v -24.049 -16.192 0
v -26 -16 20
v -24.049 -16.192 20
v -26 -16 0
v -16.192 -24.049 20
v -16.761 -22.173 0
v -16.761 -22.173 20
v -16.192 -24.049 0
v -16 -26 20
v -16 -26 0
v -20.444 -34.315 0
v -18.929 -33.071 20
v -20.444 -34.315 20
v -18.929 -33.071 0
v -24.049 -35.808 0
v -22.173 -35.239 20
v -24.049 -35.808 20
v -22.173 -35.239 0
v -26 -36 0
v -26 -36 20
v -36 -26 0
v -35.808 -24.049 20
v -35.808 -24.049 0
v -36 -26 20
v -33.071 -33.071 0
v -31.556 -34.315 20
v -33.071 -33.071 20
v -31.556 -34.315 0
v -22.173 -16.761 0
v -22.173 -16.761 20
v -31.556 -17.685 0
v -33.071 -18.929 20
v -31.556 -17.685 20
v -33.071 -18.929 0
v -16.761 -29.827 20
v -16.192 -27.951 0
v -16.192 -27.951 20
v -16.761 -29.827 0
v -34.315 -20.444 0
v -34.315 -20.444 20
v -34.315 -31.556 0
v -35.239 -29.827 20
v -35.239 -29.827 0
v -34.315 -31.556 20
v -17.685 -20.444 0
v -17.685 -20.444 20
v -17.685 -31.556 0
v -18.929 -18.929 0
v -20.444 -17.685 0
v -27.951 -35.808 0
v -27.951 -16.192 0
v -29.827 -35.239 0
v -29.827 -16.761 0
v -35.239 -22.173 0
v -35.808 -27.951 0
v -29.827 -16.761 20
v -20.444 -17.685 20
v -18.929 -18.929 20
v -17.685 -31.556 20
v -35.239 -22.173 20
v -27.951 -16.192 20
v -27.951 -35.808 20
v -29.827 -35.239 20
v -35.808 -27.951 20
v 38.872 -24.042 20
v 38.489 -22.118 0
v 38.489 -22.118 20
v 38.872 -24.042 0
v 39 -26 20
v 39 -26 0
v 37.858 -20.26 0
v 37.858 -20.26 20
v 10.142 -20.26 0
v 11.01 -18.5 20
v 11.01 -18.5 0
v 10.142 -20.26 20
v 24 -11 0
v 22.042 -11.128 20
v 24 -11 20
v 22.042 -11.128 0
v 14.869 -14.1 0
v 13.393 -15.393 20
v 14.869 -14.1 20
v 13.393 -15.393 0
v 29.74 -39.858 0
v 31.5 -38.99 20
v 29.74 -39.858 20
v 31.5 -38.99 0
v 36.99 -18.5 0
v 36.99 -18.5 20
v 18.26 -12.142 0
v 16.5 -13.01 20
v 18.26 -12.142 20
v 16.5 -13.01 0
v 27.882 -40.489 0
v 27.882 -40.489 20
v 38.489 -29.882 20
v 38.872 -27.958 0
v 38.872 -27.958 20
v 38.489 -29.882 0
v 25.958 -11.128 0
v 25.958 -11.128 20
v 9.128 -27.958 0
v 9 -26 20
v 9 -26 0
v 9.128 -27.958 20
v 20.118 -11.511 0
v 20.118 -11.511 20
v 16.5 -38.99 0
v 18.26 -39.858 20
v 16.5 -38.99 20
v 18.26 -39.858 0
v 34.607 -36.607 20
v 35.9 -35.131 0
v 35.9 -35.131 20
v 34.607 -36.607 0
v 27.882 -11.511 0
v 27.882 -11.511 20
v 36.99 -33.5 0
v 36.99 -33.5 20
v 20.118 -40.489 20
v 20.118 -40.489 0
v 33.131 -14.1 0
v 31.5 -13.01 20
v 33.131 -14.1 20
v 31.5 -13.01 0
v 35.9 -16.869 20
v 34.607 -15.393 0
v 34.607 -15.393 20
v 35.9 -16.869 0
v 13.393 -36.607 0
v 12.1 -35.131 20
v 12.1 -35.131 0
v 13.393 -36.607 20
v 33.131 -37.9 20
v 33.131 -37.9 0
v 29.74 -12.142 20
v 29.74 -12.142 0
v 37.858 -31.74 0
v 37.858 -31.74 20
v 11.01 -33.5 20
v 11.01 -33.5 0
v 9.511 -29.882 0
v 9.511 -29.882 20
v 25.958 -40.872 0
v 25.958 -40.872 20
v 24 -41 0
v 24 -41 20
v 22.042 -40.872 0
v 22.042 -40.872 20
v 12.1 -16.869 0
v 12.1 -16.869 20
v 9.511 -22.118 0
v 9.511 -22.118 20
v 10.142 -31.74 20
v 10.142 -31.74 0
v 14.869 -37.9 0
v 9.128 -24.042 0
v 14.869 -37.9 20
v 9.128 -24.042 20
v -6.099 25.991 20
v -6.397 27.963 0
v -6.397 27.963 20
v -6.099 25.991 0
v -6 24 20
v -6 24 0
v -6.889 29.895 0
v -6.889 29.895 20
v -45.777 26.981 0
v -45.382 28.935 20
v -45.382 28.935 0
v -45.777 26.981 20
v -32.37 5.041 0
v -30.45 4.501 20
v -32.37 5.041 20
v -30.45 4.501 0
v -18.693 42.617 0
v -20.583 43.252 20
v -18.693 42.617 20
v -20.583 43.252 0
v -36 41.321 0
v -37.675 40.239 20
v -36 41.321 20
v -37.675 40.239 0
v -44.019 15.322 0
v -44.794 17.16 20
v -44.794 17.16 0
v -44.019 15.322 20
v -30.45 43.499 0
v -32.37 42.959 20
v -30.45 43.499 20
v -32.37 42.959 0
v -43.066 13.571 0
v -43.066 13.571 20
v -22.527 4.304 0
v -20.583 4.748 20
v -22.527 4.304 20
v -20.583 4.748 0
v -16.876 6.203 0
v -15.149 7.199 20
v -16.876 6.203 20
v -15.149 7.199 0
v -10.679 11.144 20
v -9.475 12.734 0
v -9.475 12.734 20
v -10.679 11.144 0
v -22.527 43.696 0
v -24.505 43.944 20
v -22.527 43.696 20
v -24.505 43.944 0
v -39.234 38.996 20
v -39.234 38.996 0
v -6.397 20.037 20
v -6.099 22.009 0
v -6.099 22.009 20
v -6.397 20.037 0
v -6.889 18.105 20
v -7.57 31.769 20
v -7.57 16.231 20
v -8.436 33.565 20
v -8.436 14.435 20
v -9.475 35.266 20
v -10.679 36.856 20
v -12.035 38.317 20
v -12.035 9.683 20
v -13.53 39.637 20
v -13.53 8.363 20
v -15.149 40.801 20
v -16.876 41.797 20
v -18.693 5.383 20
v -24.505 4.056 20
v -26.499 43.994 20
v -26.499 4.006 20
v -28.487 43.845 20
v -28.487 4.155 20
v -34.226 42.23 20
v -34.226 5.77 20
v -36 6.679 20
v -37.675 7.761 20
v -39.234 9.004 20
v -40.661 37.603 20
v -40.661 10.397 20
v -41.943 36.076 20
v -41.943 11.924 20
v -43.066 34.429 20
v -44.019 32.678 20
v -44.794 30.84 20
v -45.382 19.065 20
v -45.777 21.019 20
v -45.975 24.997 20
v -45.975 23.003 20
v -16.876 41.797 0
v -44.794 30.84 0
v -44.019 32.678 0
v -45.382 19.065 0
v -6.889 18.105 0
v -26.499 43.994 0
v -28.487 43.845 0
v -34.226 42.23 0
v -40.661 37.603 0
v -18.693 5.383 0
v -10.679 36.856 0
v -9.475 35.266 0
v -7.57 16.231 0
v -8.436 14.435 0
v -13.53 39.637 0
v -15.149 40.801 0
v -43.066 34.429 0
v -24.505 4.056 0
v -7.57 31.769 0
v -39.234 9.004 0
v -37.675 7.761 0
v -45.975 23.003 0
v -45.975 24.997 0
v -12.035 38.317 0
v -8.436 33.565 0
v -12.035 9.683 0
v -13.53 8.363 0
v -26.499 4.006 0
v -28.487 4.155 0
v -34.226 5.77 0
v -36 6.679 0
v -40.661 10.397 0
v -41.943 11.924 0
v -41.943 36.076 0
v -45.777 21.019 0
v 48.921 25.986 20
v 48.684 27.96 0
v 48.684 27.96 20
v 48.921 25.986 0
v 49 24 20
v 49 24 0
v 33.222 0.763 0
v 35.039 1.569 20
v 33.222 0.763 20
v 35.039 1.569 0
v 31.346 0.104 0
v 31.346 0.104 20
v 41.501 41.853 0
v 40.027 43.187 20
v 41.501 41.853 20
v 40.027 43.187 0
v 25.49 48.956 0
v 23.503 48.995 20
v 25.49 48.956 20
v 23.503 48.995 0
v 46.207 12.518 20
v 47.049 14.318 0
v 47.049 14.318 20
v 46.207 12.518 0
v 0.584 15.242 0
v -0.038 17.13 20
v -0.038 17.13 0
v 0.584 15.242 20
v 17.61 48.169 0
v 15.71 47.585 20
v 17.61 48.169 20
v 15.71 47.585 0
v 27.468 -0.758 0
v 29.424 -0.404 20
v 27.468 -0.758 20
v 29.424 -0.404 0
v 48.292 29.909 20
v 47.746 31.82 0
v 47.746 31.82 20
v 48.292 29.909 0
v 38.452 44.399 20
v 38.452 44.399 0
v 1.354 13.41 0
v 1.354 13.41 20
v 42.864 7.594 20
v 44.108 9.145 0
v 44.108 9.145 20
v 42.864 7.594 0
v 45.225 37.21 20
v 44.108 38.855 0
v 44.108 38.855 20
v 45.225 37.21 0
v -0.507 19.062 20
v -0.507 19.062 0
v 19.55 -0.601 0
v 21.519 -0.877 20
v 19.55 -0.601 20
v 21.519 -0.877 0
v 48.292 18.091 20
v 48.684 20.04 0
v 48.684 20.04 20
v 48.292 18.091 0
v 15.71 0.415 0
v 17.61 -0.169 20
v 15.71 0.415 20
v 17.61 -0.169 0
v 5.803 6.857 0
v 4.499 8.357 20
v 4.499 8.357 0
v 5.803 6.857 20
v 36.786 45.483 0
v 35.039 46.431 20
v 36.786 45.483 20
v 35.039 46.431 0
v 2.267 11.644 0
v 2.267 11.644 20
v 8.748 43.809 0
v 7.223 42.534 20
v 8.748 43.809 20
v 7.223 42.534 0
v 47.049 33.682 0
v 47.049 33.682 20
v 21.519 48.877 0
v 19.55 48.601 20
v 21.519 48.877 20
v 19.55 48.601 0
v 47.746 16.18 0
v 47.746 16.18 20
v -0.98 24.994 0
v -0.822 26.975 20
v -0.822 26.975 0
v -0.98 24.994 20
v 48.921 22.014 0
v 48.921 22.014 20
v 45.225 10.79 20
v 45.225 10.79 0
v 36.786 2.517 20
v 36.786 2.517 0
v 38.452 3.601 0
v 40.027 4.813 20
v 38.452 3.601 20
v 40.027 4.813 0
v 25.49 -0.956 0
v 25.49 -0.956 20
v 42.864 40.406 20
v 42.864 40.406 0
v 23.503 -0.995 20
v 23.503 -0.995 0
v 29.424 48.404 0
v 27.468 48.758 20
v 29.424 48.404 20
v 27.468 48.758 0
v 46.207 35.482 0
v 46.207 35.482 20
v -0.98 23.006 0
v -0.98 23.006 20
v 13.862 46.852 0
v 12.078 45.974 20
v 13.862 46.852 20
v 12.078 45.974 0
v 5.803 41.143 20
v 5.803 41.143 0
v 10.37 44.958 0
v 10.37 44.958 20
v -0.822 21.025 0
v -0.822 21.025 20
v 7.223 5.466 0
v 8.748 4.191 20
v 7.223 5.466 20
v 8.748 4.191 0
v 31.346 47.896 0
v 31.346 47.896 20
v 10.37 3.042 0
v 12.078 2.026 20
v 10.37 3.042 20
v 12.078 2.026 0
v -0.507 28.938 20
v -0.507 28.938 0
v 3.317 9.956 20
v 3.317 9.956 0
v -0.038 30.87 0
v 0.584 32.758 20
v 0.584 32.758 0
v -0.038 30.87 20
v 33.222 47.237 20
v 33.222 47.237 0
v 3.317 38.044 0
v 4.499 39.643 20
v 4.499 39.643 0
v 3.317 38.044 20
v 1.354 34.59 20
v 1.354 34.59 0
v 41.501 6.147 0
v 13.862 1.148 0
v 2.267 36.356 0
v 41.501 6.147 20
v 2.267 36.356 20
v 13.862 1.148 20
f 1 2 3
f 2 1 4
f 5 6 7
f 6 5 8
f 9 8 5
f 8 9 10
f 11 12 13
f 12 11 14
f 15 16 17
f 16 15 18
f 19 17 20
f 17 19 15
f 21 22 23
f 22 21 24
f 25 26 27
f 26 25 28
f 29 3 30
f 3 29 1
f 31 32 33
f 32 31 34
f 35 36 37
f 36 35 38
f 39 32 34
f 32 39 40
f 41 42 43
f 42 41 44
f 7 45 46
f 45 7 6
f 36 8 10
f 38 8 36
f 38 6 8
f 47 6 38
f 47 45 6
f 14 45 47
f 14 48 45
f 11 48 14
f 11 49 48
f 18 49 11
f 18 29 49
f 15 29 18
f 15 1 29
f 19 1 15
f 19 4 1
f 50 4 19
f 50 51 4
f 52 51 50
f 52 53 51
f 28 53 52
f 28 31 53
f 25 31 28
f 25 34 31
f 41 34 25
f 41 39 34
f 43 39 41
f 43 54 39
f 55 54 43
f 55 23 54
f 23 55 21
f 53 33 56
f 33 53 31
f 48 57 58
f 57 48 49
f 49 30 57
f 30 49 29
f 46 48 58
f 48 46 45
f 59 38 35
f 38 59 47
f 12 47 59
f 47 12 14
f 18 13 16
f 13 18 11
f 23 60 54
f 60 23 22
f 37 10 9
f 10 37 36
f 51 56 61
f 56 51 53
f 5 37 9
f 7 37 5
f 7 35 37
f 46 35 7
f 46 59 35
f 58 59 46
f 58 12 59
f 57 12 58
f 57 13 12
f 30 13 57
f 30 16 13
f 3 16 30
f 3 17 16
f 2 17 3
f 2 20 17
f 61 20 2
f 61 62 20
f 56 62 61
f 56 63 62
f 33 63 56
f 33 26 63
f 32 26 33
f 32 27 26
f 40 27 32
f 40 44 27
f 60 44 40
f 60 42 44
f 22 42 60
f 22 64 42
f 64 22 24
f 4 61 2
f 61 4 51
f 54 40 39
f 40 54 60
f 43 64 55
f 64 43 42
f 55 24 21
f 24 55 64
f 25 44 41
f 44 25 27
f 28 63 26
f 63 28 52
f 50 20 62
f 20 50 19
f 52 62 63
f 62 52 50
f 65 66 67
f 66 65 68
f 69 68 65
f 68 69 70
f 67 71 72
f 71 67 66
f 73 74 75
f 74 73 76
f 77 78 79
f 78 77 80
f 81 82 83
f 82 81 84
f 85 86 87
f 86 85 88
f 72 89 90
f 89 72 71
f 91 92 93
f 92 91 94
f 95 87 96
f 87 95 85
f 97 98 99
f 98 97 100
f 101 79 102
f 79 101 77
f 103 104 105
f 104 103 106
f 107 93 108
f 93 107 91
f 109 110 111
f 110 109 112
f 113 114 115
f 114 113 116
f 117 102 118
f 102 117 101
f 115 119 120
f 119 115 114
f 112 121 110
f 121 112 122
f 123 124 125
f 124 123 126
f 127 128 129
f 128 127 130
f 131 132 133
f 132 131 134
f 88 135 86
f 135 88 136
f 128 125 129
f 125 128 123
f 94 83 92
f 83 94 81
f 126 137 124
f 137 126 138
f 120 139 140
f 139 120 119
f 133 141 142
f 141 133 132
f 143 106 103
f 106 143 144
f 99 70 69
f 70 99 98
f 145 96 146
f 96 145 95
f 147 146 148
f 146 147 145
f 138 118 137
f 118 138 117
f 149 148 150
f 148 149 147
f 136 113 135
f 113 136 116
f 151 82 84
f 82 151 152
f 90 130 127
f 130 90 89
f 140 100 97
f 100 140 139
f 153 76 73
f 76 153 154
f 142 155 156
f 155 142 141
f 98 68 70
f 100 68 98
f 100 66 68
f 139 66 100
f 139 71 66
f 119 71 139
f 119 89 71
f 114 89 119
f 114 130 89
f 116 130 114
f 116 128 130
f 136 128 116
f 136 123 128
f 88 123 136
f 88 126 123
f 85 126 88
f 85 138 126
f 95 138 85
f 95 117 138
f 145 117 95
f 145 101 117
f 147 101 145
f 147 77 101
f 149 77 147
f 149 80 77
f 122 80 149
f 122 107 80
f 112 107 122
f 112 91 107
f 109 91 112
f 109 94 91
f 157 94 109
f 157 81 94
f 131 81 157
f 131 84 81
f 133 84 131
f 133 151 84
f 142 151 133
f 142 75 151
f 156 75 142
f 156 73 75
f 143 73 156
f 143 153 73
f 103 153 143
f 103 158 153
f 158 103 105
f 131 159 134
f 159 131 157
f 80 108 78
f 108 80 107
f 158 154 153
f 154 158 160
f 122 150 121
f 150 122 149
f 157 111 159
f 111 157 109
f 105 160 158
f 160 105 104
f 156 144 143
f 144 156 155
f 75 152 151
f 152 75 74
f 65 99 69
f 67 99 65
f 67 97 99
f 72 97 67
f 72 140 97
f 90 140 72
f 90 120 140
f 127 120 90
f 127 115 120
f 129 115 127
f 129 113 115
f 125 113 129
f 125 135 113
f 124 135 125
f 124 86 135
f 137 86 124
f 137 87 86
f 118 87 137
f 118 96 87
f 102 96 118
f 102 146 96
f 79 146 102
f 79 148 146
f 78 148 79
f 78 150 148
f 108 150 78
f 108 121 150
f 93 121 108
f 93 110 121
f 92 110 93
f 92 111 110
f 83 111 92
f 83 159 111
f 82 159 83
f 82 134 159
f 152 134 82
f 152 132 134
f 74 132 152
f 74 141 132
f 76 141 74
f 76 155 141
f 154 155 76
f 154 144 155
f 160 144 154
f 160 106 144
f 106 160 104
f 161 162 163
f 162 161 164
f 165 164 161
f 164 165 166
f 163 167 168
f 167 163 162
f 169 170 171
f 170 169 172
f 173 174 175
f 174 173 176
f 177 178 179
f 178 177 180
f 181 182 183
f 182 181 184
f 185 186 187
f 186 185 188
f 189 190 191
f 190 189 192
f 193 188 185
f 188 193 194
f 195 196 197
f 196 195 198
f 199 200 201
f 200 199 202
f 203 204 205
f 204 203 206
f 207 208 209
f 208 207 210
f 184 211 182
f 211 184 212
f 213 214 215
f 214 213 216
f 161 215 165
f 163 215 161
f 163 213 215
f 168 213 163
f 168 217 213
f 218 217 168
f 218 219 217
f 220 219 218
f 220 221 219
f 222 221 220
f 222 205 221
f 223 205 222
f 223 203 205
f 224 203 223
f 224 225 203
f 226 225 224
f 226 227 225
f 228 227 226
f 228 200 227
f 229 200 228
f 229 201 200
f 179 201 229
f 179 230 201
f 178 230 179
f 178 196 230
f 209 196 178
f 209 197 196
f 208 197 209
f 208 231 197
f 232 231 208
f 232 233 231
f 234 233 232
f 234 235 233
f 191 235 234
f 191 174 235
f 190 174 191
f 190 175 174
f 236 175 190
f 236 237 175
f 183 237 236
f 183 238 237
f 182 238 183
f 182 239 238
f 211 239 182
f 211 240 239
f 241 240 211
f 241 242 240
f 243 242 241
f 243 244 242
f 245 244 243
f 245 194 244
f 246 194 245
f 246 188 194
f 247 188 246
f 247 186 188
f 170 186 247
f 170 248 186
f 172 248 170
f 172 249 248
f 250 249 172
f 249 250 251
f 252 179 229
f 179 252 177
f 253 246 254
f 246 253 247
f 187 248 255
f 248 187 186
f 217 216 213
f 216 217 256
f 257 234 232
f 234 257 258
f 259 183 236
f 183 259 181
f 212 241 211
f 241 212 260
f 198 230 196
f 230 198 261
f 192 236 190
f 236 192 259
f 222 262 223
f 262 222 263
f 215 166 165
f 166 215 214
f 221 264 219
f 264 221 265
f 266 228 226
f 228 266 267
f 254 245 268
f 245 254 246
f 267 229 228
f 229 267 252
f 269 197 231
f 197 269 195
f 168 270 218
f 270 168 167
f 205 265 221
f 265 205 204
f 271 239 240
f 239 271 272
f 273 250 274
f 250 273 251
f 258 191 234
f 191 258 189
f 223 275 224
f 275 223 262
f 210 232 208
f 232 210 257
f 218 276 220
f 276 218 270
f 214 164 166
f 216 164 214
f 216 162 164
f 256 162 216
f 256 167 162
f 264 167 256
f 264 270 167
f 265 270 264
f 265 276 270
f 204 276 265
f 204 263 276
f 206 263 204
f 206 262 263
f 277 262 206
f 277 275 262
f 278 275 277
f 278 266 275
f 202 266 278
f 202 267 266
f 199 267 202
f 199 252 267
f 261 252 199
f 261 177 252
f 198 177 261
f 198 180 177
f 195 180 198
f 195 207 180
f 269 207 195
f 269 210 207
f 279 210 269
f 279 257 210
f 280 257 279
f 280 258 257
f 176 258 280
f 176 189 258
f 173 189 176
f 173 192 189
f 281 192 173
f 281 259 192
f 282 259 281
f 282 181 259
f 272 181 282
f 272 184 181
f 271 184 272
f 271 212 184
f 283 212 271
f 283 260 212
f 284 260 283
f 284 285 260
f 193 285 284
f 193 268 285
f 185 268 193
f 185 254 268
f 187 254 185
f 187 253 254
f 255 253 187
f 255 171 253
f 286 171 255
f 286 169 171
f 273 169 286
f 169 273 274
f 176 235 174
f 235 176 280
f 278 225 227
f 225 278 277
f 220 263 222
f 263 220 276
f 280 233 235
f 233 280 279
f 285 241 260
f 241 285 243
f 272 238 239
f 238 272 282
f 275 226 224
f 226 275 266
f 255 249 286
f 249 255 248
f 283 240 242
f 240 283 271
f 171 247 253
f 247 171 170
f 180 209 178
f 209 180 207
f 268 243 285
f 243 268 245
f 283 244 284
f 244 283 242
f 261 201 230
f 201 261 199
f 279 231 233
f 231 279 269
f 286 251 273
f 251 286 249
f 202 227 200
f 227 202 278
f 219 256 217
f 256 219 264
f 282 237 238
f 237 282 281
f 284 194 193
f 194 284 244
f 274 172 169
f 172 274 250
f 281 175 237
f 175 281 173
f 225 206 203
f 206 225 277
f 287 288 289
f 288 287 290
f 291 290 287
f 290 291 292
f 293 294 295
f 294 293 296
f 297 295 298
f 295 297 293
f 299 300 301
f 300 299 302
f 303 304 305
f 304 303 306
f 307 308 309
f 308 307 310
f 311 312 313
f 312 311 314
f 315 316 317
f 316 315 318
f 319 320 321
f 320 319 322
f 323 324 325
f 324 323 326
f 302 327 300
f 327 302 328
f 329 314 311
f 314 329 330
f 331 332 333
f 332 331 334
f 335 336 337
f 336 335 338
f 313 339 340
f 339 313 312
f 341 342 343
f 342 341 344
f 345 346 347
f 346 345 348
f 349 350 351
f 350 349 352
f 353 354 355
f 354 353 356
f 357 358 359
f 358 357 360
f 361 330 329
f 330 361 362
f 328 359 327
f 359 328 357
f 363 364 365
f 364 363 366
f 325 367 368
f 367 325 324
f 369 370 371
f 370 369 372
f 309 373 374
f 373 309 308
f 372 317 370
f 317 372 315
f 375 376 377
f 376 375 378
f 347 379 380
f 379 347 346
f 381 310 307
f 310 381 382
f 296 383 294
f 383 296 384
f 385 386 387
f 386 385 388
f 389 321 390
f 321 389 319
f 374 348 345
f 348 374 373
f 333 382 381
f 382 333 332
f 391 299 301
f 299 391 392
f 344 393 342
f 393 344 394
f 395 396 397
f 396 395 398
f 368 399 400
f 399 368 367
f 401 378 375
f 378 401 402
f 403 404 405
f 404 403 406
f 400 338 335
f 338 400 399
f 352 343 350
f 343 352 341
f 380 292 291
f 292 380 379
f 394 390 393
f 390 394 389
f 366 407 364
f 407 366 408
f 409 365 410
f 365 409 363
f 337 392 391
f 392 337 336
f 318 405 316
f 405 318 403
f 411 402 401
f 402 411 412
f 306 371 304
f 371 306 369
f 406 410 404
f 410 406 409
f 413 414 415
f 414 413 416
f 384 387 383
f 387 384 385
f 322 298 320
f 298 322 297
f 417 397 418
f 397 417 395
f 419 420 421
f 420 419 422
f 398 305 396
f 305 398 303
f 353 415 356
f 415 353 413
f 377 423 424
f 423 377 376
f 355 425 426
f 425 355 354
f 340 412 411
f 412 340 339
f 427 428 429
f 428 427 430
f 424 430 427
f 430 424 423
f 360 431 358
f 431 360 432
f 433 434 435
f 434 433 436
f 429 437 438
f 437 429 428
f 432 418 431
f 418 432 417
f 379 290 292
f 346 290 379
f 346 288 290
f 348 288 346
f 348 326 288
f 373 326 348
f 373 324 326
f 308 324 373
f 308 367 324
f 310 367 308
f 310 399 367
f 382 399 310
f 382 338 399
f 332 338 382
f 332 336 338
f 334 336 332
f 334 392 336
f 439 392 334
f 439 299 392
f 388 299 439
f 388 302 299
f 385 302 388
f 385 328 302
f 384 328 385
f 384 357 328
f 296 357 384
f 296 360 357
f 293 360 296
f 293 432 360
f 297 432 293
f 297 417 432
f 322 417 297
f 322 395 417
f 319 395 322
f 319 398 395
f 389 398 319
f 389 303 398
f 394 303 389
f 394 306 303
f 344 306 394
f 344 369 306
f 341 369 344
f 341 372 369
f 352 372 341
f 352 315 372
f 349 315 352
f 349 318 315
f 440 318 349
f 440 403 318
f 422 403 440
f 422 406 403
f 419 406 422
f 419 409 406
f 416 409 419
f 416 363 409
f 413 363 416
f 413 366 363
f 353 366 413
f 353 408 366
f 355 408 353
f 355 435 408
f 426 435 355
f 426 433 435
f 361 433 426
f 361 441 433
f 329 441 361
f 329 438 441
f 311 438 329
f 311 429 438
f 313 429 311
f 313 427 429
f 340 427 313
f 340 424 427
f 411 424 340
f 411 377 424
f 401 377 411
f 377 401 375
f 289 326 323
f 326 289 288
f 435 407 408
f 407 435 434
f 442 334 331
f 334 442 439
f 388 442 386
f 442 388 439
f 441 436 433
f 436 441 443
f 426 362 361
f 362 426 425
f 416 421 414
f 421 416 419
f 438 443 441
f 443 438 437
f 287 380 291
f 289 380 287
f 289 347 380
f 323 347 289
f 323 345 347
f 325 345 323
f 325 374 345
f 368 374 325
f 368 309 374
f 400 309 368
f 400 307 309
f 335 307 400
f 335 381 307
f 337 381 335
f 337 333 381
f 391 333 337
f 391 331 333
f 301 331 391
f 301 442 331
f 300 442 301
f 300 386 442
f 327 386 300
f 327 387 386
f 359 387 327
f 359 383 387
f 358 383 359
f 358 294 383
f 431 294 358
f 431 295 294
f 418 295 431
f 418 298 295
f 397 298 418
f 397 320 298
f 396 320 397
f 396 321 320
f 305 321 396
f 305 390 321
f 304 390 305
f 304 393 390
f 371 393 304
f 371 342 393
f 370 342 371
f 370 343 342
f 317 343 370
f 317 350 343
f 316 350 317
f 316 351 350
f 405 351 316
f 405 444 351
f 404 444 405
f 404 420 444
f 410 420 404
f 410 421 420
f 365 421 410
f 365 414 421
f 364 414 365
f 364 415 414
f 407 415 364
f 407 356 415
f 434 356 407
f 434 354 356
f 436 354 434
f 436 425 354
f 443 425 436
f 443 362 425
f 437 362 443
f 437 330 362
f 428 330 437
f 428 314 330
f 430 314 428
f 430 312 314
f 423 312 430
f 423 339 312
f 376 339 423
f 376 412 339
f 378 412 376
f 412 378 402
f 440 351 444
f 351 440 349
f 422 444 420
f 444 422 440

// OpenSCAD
height = 20;
radius_min = 5;
radius_max = 25;
count = 4;

side_counts = ceil(sqrt(count));
echo("Side Count: ", side_counts);

radius_step = (radius_max - radius_min) / count;

base_height = 1;
base_width = 2 * side_counts * radius_max + 2;

translate([-base_width/2, -base_width/2, 0])
union() {
translate([radius_max, radius_max, 0])
for(i = [0:side_counts-1]) {
  for(j = [0:side_counts-1]) {
    k = i * side_counts + j + 1;
    echo("i: ", i, "j: ", j, "k: ", k);
    if (k < count + 1) {
      radius = radius_min + radius_step * k;
      translate([j*2*radius_max, i*2*radius_max, 0])
      cylinder(h=height, r1=radius, r2=radius, $fa=1);
    }
  }
}
}
